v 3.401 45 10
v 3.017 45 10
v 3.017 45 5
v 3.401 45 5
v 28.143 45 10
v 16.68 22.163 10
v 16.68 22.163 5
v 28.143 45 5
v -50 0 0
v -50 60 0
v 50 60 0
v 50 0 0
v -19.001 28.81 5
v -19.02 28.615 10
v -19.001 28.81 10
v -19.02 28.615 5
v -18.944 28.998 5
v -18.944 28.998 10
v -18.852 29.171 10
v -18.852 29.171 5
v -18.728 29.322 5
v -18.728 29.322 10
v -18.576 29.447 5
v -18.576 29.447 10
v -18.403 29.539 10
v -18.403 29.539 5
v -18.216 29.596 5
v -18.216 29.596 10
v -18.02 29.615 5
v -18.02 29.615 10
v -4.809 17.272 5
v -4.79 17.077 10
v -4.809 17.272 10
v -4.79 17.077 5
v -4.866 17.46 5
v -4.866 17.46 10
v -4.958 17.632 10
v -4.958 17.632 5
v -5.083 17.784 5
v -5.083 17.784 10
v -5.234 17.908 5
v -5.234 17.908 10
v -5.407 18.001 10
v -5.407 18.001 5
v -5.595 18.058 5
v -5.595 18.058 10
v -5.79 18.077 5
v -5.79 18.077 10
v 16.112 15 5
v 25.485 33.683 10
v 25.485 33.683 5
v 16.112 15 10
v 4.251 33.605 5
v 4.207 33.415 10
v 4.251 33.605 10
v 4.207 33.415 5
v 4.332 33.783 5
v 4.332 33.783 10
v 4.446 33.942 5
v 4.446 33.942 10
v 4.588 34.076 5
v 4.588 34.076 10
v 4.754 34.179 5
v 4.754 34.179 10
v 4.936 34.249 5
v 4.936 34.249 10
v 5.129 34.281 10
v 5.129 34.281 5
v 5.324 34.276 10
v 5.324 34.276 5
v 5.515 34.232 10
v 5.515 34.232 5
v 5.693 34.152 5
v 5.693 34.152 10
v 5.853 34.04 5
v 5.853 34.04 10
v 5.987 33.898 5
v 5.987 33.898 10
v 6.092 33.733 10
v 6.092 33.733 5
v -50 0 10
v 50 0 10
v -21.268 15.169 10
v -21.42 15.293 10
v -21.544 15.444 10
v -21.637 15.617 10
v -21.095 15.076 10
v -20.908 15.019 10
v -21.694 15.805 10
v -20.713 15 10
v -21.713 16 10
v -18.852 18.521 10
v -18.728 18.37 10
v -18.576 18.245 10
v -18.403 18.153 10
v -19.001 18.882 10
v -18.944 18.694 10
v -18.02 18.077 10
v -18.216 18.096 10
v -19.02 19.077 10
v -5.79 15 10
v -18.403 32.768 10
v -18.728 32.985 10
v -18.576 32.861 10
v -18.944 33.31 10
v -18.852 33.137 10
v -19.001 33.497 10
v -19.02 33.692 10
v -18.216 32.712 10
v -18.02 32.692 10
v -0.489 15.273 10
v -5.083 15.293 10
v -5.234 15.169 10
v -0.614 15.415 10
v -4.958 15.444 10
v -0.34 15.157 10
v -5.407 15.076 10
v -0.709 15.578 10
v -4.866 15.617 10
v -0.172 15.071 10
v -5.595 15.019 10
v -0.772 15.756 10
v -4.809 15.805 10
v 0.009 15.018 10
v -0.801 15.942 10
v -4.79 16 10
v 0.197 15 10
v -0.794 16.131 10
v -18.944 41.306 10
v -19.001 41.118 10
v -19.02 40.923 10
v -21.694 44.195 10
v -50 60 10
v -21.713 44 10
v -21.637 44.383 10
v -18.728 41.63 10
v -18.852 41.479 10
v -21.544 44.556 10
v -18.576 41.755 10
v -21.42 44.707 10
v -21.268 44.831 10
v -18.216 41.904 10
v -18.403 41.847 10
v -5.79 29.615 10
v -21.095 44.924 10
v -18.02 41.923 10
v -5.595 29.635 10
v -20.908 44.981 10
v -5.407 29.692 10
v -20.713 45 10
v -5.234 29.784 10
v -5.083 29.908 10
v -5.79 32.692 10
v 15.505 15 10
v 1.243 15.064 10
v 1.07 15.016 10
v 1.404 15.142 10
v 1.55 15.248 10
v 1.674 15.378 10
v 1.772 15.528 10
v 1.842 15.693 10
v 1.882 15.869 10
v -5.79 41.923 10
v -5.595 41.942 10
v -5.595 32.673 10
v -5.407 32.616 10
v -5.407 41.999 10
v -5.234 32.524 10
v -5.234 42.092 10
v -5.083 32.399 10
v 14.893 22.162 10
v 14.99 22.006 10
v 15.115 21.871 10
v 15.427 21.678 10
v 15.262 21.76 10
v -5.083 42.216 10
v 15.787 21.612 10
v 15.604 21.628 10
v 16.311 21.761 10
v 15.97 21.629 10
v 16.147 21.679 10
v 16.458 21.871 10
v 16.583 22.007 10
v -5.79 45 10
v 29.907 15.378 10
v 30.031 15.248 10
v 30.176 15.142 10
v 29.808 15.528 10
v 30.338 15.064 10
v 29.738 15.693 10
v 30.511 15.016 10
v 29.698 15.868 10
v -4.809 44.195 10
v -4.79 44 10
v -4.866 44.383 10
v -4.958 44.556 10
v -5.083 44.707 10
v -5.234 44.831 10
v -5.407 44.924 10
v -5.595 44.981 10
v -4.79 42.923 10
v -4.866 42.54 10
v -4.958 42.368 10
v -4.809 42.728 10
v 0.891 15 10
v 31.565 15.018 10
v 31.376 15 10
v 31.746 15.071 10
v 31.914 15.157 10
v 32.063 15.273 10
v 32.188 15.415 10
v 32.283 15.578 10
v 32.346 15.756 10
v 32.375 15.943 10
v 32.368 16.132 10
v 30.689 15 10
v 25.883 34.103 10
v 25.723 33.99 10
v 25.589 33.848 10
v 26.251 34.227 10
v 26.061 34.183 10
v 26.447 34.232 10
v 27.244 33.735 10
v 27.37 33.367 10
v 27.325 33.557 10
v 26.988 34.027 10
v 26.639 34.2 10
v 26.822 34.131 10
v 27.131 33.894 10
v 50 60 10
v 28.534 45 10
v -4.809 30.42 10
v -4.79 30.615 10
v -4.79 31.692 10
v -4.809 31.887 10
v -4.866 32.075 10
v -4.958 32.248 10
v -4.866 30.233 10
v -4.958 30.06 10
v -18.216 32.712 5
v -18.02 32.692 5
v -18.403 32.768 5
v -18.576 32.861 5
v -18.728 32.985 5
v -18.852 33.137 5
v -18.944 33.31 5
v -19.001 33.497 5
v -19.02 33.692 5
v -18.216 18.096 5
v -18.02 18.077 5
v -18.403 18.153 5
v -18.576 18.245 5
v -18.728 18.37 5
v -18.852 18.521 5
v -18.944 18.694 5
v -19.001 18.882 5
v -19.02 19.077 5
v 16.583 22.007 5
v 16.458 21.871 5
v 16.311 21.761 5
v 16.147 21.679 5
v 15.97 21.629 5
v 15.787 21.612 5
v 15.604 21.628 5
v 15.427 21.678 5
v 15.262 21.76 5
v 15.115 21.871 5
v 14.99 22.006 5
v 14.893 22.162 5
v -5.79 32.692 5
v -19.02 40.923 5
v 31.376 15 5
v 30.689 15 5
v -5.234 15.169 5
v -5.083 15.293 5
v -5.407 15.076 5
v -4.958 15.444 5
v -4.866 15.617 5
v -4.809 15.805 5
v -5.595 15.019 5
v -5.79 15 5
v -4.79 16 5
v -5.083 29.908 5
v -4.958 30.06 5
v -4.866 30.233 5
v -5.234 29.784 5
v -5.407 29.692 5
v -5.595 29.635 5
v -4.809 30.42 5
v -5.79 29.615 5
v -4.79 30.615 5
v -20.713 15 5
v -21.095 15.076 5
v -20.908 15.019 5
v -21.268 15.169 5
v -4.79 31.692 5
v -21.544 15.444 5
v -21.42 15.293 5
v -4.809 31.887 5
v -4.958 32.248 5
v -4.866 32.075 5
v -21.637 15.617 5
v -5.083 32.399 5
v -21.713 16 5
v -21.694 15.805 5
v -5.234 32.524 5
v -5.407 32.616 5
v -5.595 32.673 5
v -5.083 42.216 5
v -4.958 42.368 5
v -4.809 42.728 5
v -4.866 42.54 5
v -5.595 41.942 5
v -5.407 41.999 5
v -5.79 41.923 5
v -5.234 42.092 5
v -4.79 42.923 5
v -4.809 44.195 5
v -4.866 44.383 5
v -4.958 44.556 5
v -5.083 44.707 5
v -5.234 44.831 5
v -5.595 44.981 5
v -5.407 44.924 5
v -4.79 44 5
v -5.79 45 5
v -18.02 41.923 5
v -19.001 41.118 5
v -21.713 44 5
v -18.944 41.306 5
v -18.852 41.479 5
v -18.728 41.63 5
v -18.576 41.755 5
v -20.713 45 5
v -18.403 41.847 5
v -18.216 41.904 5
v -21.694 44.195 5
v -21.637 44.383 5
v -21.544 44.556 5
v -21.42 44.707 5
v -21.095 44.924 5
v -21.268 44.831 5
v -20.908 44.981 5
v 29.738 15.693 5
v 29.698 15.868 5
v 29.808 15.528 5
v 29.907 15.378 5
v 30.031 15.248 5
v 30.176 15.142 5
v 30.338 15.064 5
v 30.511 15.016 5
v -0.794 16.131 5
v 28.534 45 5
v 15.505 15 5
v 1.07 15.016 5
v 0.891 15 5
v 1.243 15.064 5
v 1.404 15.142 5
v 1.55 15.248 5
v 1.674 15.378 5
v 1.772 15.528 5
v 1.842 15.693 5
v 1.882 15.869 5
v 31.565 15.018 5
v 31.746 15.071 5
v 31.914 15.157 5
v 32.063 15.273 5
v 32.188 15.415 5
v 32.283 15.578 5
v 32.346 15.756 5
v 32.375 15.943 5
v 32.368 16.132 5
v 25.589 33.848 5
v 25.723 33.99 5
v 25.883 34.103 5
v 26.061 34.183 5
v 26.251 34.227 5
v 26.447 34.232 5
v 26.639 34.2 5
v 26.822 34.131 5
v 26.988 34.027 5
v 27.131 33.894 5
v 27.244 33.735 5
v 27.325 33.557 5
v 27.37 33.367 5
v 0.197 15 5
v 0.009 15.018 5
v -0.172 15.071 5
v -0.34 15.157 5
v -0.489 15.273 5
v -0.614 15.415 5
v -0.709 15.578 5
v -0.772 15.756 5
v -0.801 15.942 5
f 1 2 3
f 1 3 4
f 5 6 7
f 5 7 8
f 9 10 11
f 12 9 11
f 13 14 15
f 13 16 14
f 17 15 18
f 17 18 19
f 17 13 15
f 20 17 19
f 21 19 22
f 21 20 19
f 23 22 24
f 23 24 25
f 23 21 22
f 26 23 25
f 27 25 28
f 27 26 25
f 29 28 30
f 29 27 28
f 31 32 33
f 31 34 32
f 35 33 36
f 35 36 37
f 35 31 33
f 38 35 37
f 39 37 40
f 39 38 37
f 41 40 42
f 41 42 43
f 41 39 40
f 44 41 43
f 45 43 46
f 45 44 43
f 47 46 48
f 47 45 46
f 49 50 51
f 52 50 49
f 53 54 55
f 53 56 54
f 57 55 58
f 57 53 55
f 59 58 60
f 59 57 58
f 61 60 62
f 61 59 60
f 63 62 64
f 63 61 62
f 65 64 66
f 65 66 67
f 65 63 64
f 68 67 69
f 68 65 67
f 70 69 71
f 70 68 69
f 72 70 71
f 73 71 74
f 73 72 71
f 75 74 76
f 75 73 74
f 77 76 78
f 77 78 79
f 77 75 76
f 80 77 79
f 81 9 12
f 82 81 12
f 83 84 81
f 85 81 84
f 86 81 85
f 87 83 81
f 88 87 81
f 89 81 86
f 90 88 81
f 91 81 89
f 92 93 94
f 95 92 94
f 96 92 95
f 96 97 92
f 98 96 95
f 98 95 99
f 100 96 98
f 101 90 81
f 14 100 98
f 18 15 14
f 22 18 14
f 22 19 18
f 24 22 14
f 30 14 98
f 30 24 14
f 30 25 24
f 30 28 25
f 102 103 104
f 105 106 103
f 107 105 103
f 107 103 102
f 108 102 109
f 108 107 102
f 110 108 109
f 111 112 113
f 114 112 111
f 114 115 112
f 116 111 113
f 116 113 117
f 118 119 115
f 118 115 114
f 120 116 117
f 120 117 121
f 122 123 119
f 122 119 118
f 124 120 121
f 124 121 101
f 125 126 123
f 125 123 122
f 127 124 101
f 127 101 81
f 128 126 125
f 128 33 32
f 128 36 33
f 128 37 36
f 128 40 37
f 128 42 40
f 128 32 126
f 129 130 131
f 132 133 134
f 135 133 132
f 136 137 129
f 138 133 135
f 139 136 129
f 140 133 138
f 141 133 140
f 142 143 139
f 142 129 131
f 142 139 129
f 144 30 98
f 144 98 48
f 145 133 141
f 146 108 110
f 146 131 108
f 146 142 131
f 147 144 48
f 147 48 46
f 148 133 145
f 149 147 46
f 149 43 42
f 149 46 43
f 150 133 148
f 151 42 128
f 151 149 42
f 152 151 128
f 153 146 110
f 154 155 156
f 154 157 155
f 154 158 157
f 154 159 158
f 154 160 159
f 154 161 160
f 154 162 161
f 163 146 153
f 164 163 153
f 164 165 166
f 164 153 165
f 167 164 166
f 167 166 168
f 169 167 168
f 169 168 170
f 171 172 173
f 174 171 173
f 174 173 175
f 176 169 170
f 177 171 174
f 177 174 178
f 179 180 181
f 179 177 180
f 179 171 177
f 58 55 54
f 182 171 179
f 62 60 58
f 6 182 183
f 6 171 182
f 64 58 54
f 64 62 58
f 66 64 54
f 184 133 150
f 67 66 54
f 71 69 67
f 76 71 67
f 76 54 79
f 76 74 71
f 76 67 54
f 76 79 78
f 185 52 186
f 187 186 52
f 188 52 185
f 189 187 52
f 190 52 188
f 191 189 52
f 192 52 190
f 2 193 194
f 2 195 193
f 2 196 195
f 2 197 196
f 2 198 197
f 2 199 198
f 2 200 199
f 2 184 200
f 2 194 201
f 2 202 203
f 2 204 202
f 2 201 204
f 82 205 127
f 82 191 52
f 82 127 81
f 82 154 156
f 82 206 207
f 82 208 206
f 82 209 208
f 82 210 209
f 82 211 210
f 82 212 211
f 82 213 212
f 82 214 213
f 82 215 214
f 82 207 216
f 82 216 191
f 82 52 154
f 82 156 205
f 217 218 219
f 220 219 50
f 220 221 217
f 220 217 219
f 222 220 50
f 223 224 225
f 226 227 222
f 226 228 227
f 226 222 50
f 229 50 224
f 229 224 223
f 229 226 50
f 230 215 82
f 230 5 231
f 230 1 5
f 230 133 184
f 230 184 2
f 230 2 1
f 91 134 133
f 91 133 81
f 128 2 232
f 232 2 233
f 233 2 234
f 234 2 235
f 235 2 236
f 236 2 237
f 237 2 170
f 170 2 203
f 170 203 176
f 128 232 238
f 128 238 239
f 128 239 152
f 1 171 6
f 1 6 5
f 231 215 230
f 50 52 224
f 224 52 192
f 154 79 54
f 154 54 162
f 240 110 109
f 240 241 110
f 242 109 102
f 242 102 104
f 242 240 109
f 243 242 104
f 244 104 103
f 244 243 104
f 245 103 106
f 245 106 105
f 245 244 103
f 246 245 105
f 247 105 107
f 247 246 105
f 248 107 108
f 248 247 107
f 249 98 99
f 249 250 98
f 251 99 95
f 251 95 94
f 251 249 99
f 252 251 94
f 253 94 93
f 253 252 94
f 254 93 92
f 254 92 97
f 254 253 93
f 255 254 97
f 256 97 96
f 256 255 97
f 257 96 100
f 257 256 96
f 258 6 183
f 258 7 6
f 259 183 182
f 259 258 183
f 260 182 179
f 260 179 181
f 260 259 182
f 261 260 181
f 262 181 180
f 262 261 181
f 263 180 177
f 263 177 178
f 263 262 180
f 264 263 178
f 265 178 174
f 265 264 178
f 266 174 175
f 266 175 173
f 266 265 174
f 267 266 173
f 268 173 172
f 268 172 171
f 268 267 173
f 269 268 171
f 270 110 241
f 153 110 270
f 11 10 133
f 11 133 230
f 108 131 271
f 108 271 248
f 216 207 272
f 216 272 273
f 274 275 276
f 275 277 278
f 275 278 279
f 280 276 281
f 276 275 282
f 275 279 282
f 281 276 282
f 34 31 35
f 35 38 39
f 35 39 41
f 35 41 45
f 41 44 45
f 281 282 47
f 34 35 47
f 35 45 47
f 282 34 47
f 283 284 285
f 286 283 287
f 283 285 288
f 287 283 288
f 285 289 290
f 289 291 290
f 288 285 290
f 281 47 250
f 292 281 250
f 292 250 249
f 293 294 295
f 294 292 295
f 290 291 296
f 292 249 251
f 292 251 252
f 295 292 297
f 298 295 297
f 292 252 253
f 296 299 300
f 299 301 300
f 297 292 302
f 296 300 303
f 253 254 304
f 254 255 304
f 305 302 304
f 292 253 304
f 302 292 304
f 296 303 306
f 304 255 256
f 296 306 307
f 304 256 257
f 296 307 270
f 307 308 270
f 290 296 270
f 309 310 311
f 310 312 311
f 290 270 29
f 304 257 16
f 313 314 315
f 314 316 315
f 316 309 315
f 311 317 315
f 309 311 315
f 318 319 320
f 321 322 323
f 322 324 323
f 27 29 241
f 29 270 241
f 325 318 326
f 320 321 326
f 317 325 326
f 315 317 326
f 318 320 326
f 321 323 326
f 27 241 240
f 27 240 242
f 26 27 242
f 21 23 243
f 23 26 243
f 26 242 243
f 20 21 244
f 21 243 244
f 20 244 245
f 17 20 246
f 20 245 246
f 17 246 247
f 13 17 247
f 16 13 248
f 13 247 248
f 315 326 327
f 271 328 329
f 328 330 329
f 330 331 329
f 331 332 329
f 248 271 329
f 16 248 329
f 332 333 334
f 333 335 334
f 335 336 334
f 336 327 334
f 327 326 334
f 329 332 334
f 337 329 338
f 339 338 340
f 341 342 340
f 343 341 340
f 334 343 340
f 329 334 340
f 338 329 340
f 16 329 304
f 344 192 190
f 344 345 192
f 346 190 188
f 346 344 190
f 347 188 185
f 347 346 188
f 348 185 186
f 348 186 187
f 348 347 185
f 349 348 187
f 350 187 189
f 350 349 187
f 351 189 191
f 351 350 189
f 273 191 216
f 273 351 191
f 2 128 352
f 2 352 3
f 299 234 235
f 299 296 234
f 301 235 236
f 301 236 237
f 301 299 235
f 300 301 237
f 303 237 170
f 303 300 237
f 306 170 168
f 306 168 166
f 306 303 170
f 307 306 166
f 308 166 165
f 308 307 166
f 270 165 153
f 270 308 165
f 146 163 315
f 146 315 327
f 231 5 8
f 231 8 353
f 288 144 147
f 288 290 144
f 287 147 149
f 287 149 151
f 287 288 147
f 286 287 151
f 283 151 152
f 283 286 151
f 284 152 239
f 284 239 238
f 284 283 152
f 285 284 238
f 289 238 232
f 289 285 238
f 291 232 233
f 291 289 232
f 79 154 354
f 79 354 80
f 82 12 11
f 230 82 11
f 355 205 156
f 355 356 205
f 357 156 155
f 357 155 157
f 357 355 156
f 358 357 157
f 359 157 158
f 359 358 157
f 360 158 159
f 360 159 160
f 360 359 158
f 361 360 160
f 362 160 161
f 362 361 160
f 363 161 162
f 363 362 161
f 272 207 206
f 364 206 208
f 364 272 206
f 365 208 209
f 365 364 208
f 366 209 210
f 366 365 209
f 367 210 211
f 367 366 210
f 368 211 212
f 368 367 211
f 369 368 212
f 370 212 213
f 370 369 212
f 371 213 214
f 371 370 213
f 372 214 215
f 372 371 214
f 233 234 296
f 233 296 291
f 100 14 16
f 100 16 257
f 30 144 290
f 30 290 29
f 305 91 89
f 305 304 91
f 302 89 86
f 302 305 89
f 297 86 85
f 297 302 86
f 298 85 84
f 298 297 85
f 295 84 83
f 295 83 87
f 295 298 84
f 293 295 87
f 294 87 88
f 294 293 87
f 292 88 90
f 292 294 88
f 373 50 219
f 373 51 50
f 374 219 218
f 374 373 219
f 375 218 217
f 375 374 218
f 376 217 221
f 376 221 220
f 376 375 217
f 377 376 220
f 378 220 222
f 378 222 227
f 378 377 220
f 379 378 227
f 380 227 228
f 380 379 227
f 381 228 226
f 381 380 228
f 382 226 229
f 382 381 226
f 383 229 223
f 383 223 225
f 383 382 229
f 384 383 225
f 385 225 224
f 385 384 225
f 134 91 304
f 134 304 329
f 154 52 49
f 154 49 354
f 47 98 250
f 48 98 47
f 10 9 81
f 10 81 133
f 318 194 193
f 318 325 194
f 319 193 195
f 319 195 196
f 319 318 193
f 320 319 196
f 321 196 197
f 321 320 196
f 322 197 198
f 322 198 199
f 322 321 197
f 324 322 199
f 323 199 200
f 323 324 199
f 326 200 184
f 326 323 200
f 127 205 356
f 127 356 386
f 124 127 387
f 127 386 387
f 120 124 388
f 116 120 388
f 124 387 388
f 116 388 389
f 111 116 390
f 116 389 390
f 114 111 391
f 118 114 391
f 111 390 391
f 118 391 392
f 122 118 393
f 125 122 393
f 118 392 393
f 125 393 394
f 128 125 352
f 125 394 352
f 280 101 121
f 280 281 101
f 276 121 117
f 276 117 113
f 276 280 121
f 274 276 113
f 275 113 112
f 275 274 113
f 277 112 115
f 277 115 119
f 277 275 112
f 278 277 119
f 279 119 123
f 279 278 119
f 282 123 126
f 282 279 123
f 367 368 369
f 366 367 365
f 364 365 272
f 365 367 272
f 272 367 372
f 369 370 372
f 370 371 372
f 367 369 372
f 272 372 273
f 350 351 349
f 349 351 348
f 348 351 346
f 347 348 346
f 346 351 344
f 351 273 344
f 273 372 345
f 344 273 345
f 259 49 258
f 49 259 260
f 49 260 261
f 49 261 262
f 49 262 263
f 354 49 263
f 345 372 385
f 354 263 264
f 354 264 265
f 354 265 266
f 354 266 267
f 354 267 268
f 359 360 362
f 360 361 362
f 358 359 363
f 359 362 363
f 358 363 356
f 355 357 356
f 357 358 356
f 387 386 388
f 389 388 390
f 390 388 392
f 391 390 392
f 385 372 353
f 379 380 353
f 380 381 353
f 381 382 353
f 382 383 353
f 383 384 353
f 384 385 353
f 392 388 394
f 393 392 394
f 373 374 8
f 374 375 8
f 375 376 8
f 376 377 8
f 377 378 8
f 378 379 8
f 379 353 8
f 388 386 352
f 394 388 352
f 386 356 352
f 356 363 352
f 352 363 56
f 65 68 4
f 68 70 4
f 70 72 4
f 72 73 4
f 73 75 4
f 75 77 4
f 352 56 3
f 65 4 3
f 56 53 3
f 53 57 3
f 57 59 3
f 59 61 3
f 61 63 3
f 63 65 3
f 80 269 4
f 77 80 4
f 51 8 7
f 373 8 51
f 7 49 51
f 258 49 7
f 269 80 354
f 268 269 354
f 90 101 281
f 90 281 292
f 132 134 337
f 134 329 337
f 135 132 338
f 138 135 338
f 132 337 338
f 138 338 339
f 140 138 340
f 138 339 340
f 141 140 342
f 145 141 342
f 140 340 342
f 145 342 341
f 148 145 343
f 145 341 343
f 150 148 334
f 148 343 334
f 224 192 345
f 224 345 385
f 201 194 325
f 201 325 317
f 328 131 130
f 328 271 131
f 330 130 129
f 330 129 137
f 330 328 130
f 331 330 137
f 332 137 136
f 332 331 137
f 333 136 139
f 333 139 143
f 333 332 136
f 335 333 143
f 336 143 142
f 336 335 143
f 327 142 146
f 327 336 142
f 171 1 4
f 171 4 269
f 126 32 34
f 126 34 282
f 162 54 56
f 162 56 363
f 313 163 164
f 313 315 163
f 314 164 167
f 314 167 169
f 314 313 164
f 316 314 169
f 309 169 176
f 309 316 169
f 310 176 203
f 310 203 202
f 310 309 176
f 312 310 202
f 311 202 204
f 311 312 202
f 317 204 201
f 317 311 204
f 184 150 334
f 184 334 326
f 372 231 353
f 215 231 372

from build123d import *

# Parameters (mm, degrees)
SKETCH3_W           = 100
SKETCH3_H           = 60
BOSS_EXTRUDE3_DEPTH = 10
CUT_EXTRUDE1_START  = 10
CUT_EXTRUDE1_DEPTH  = 5
FILLET1_R           = 1


with BuildPart() as part:
    # Sketch3 → Boss-Extrude3 (new body)
    with BuildSketch(Plane.XY):
        with Locations((0, 30)):
            Rectangle(SKETCH3_W, SKETCH3_H)
    extrude(amount=BOSS_EXTRUDE3_DEPTH)

    # Sketch1<2> → Cut-Extrude1 (cut)
    with BuildSketch(Plane.XY.offset(CUT_EXTRUDE1_START)):
        Polygon((-21.712736005, 45), (-4.789659082, 45), (-4.789659082, 41.923076923), (-19.020428312, 41.923076923), (-19.020428312, 32.692307692), (-4.789659082, 32.692307692), (-4.789659082, 29.615384615), (-19.020428312, 29.615384615), (-19.020428312, 18.076923077), (-4.789659082, 18.076923077), (-4.789659082, 15), (-21.712736005, 15), align=None)
        Polygon((-0.943505235, 15), (3.016831303, 45), (3.401446688, 45), (15.787263995, 20.384615385), (28.143033226, 45), (28.533658226, 45), (32.518033226, 15), (29.813706303, 15), (26.941110149, 36.586538462), (16.111783226, 15), (15.504812072, 15), (4.633417841, 36.634615385), (1.766831303, 15), align=None)
    extrude(amount=-CUT_EXTRUDE1_DEPTH, mode=Mode.SUBTRACT)

    # Fillet1
    fillet1_edges = [part.edges().sort_by_distance(p)[0] for p in [
        (-4.789659082, 15, 7.5),
        (-21.712736005, 15, 7.5),
        (-21.712736005, 45, 7.5),
        (-4.789659082, 45, 7.5),
        (-4.789659082, 41.923076923, 7.5),
        (-19.020428312, 41.923076923, 7.5),
        (-19.020428312, 32.692307692, 7.5),
        (-4.789659082, 32.692307692, 7.5),
        (-4.789659082, 29.615384615, 7.5),
        (-19.020428312, 29.615384615, 7.5),
        (-19.020428312, 18.076923077, 7.5),
        (-4.789659082, 18.076923077, 7.5),
        (15.787263995, 20.384615385, 7.5),
        (32.518033226, 15, 7.5),
        (29.813706303, 15, 7.5),
        (26.941110149, 36.586538462, 7.5),
        (4.633417841, 36.634615385, 7.5),
        (1.766831303, 15, 7.5),
        (-0.943505235, 15, 7.5),
    ]]
    fillet(fillet1_edges, radius=FILLET1_R)


solid = part.part
